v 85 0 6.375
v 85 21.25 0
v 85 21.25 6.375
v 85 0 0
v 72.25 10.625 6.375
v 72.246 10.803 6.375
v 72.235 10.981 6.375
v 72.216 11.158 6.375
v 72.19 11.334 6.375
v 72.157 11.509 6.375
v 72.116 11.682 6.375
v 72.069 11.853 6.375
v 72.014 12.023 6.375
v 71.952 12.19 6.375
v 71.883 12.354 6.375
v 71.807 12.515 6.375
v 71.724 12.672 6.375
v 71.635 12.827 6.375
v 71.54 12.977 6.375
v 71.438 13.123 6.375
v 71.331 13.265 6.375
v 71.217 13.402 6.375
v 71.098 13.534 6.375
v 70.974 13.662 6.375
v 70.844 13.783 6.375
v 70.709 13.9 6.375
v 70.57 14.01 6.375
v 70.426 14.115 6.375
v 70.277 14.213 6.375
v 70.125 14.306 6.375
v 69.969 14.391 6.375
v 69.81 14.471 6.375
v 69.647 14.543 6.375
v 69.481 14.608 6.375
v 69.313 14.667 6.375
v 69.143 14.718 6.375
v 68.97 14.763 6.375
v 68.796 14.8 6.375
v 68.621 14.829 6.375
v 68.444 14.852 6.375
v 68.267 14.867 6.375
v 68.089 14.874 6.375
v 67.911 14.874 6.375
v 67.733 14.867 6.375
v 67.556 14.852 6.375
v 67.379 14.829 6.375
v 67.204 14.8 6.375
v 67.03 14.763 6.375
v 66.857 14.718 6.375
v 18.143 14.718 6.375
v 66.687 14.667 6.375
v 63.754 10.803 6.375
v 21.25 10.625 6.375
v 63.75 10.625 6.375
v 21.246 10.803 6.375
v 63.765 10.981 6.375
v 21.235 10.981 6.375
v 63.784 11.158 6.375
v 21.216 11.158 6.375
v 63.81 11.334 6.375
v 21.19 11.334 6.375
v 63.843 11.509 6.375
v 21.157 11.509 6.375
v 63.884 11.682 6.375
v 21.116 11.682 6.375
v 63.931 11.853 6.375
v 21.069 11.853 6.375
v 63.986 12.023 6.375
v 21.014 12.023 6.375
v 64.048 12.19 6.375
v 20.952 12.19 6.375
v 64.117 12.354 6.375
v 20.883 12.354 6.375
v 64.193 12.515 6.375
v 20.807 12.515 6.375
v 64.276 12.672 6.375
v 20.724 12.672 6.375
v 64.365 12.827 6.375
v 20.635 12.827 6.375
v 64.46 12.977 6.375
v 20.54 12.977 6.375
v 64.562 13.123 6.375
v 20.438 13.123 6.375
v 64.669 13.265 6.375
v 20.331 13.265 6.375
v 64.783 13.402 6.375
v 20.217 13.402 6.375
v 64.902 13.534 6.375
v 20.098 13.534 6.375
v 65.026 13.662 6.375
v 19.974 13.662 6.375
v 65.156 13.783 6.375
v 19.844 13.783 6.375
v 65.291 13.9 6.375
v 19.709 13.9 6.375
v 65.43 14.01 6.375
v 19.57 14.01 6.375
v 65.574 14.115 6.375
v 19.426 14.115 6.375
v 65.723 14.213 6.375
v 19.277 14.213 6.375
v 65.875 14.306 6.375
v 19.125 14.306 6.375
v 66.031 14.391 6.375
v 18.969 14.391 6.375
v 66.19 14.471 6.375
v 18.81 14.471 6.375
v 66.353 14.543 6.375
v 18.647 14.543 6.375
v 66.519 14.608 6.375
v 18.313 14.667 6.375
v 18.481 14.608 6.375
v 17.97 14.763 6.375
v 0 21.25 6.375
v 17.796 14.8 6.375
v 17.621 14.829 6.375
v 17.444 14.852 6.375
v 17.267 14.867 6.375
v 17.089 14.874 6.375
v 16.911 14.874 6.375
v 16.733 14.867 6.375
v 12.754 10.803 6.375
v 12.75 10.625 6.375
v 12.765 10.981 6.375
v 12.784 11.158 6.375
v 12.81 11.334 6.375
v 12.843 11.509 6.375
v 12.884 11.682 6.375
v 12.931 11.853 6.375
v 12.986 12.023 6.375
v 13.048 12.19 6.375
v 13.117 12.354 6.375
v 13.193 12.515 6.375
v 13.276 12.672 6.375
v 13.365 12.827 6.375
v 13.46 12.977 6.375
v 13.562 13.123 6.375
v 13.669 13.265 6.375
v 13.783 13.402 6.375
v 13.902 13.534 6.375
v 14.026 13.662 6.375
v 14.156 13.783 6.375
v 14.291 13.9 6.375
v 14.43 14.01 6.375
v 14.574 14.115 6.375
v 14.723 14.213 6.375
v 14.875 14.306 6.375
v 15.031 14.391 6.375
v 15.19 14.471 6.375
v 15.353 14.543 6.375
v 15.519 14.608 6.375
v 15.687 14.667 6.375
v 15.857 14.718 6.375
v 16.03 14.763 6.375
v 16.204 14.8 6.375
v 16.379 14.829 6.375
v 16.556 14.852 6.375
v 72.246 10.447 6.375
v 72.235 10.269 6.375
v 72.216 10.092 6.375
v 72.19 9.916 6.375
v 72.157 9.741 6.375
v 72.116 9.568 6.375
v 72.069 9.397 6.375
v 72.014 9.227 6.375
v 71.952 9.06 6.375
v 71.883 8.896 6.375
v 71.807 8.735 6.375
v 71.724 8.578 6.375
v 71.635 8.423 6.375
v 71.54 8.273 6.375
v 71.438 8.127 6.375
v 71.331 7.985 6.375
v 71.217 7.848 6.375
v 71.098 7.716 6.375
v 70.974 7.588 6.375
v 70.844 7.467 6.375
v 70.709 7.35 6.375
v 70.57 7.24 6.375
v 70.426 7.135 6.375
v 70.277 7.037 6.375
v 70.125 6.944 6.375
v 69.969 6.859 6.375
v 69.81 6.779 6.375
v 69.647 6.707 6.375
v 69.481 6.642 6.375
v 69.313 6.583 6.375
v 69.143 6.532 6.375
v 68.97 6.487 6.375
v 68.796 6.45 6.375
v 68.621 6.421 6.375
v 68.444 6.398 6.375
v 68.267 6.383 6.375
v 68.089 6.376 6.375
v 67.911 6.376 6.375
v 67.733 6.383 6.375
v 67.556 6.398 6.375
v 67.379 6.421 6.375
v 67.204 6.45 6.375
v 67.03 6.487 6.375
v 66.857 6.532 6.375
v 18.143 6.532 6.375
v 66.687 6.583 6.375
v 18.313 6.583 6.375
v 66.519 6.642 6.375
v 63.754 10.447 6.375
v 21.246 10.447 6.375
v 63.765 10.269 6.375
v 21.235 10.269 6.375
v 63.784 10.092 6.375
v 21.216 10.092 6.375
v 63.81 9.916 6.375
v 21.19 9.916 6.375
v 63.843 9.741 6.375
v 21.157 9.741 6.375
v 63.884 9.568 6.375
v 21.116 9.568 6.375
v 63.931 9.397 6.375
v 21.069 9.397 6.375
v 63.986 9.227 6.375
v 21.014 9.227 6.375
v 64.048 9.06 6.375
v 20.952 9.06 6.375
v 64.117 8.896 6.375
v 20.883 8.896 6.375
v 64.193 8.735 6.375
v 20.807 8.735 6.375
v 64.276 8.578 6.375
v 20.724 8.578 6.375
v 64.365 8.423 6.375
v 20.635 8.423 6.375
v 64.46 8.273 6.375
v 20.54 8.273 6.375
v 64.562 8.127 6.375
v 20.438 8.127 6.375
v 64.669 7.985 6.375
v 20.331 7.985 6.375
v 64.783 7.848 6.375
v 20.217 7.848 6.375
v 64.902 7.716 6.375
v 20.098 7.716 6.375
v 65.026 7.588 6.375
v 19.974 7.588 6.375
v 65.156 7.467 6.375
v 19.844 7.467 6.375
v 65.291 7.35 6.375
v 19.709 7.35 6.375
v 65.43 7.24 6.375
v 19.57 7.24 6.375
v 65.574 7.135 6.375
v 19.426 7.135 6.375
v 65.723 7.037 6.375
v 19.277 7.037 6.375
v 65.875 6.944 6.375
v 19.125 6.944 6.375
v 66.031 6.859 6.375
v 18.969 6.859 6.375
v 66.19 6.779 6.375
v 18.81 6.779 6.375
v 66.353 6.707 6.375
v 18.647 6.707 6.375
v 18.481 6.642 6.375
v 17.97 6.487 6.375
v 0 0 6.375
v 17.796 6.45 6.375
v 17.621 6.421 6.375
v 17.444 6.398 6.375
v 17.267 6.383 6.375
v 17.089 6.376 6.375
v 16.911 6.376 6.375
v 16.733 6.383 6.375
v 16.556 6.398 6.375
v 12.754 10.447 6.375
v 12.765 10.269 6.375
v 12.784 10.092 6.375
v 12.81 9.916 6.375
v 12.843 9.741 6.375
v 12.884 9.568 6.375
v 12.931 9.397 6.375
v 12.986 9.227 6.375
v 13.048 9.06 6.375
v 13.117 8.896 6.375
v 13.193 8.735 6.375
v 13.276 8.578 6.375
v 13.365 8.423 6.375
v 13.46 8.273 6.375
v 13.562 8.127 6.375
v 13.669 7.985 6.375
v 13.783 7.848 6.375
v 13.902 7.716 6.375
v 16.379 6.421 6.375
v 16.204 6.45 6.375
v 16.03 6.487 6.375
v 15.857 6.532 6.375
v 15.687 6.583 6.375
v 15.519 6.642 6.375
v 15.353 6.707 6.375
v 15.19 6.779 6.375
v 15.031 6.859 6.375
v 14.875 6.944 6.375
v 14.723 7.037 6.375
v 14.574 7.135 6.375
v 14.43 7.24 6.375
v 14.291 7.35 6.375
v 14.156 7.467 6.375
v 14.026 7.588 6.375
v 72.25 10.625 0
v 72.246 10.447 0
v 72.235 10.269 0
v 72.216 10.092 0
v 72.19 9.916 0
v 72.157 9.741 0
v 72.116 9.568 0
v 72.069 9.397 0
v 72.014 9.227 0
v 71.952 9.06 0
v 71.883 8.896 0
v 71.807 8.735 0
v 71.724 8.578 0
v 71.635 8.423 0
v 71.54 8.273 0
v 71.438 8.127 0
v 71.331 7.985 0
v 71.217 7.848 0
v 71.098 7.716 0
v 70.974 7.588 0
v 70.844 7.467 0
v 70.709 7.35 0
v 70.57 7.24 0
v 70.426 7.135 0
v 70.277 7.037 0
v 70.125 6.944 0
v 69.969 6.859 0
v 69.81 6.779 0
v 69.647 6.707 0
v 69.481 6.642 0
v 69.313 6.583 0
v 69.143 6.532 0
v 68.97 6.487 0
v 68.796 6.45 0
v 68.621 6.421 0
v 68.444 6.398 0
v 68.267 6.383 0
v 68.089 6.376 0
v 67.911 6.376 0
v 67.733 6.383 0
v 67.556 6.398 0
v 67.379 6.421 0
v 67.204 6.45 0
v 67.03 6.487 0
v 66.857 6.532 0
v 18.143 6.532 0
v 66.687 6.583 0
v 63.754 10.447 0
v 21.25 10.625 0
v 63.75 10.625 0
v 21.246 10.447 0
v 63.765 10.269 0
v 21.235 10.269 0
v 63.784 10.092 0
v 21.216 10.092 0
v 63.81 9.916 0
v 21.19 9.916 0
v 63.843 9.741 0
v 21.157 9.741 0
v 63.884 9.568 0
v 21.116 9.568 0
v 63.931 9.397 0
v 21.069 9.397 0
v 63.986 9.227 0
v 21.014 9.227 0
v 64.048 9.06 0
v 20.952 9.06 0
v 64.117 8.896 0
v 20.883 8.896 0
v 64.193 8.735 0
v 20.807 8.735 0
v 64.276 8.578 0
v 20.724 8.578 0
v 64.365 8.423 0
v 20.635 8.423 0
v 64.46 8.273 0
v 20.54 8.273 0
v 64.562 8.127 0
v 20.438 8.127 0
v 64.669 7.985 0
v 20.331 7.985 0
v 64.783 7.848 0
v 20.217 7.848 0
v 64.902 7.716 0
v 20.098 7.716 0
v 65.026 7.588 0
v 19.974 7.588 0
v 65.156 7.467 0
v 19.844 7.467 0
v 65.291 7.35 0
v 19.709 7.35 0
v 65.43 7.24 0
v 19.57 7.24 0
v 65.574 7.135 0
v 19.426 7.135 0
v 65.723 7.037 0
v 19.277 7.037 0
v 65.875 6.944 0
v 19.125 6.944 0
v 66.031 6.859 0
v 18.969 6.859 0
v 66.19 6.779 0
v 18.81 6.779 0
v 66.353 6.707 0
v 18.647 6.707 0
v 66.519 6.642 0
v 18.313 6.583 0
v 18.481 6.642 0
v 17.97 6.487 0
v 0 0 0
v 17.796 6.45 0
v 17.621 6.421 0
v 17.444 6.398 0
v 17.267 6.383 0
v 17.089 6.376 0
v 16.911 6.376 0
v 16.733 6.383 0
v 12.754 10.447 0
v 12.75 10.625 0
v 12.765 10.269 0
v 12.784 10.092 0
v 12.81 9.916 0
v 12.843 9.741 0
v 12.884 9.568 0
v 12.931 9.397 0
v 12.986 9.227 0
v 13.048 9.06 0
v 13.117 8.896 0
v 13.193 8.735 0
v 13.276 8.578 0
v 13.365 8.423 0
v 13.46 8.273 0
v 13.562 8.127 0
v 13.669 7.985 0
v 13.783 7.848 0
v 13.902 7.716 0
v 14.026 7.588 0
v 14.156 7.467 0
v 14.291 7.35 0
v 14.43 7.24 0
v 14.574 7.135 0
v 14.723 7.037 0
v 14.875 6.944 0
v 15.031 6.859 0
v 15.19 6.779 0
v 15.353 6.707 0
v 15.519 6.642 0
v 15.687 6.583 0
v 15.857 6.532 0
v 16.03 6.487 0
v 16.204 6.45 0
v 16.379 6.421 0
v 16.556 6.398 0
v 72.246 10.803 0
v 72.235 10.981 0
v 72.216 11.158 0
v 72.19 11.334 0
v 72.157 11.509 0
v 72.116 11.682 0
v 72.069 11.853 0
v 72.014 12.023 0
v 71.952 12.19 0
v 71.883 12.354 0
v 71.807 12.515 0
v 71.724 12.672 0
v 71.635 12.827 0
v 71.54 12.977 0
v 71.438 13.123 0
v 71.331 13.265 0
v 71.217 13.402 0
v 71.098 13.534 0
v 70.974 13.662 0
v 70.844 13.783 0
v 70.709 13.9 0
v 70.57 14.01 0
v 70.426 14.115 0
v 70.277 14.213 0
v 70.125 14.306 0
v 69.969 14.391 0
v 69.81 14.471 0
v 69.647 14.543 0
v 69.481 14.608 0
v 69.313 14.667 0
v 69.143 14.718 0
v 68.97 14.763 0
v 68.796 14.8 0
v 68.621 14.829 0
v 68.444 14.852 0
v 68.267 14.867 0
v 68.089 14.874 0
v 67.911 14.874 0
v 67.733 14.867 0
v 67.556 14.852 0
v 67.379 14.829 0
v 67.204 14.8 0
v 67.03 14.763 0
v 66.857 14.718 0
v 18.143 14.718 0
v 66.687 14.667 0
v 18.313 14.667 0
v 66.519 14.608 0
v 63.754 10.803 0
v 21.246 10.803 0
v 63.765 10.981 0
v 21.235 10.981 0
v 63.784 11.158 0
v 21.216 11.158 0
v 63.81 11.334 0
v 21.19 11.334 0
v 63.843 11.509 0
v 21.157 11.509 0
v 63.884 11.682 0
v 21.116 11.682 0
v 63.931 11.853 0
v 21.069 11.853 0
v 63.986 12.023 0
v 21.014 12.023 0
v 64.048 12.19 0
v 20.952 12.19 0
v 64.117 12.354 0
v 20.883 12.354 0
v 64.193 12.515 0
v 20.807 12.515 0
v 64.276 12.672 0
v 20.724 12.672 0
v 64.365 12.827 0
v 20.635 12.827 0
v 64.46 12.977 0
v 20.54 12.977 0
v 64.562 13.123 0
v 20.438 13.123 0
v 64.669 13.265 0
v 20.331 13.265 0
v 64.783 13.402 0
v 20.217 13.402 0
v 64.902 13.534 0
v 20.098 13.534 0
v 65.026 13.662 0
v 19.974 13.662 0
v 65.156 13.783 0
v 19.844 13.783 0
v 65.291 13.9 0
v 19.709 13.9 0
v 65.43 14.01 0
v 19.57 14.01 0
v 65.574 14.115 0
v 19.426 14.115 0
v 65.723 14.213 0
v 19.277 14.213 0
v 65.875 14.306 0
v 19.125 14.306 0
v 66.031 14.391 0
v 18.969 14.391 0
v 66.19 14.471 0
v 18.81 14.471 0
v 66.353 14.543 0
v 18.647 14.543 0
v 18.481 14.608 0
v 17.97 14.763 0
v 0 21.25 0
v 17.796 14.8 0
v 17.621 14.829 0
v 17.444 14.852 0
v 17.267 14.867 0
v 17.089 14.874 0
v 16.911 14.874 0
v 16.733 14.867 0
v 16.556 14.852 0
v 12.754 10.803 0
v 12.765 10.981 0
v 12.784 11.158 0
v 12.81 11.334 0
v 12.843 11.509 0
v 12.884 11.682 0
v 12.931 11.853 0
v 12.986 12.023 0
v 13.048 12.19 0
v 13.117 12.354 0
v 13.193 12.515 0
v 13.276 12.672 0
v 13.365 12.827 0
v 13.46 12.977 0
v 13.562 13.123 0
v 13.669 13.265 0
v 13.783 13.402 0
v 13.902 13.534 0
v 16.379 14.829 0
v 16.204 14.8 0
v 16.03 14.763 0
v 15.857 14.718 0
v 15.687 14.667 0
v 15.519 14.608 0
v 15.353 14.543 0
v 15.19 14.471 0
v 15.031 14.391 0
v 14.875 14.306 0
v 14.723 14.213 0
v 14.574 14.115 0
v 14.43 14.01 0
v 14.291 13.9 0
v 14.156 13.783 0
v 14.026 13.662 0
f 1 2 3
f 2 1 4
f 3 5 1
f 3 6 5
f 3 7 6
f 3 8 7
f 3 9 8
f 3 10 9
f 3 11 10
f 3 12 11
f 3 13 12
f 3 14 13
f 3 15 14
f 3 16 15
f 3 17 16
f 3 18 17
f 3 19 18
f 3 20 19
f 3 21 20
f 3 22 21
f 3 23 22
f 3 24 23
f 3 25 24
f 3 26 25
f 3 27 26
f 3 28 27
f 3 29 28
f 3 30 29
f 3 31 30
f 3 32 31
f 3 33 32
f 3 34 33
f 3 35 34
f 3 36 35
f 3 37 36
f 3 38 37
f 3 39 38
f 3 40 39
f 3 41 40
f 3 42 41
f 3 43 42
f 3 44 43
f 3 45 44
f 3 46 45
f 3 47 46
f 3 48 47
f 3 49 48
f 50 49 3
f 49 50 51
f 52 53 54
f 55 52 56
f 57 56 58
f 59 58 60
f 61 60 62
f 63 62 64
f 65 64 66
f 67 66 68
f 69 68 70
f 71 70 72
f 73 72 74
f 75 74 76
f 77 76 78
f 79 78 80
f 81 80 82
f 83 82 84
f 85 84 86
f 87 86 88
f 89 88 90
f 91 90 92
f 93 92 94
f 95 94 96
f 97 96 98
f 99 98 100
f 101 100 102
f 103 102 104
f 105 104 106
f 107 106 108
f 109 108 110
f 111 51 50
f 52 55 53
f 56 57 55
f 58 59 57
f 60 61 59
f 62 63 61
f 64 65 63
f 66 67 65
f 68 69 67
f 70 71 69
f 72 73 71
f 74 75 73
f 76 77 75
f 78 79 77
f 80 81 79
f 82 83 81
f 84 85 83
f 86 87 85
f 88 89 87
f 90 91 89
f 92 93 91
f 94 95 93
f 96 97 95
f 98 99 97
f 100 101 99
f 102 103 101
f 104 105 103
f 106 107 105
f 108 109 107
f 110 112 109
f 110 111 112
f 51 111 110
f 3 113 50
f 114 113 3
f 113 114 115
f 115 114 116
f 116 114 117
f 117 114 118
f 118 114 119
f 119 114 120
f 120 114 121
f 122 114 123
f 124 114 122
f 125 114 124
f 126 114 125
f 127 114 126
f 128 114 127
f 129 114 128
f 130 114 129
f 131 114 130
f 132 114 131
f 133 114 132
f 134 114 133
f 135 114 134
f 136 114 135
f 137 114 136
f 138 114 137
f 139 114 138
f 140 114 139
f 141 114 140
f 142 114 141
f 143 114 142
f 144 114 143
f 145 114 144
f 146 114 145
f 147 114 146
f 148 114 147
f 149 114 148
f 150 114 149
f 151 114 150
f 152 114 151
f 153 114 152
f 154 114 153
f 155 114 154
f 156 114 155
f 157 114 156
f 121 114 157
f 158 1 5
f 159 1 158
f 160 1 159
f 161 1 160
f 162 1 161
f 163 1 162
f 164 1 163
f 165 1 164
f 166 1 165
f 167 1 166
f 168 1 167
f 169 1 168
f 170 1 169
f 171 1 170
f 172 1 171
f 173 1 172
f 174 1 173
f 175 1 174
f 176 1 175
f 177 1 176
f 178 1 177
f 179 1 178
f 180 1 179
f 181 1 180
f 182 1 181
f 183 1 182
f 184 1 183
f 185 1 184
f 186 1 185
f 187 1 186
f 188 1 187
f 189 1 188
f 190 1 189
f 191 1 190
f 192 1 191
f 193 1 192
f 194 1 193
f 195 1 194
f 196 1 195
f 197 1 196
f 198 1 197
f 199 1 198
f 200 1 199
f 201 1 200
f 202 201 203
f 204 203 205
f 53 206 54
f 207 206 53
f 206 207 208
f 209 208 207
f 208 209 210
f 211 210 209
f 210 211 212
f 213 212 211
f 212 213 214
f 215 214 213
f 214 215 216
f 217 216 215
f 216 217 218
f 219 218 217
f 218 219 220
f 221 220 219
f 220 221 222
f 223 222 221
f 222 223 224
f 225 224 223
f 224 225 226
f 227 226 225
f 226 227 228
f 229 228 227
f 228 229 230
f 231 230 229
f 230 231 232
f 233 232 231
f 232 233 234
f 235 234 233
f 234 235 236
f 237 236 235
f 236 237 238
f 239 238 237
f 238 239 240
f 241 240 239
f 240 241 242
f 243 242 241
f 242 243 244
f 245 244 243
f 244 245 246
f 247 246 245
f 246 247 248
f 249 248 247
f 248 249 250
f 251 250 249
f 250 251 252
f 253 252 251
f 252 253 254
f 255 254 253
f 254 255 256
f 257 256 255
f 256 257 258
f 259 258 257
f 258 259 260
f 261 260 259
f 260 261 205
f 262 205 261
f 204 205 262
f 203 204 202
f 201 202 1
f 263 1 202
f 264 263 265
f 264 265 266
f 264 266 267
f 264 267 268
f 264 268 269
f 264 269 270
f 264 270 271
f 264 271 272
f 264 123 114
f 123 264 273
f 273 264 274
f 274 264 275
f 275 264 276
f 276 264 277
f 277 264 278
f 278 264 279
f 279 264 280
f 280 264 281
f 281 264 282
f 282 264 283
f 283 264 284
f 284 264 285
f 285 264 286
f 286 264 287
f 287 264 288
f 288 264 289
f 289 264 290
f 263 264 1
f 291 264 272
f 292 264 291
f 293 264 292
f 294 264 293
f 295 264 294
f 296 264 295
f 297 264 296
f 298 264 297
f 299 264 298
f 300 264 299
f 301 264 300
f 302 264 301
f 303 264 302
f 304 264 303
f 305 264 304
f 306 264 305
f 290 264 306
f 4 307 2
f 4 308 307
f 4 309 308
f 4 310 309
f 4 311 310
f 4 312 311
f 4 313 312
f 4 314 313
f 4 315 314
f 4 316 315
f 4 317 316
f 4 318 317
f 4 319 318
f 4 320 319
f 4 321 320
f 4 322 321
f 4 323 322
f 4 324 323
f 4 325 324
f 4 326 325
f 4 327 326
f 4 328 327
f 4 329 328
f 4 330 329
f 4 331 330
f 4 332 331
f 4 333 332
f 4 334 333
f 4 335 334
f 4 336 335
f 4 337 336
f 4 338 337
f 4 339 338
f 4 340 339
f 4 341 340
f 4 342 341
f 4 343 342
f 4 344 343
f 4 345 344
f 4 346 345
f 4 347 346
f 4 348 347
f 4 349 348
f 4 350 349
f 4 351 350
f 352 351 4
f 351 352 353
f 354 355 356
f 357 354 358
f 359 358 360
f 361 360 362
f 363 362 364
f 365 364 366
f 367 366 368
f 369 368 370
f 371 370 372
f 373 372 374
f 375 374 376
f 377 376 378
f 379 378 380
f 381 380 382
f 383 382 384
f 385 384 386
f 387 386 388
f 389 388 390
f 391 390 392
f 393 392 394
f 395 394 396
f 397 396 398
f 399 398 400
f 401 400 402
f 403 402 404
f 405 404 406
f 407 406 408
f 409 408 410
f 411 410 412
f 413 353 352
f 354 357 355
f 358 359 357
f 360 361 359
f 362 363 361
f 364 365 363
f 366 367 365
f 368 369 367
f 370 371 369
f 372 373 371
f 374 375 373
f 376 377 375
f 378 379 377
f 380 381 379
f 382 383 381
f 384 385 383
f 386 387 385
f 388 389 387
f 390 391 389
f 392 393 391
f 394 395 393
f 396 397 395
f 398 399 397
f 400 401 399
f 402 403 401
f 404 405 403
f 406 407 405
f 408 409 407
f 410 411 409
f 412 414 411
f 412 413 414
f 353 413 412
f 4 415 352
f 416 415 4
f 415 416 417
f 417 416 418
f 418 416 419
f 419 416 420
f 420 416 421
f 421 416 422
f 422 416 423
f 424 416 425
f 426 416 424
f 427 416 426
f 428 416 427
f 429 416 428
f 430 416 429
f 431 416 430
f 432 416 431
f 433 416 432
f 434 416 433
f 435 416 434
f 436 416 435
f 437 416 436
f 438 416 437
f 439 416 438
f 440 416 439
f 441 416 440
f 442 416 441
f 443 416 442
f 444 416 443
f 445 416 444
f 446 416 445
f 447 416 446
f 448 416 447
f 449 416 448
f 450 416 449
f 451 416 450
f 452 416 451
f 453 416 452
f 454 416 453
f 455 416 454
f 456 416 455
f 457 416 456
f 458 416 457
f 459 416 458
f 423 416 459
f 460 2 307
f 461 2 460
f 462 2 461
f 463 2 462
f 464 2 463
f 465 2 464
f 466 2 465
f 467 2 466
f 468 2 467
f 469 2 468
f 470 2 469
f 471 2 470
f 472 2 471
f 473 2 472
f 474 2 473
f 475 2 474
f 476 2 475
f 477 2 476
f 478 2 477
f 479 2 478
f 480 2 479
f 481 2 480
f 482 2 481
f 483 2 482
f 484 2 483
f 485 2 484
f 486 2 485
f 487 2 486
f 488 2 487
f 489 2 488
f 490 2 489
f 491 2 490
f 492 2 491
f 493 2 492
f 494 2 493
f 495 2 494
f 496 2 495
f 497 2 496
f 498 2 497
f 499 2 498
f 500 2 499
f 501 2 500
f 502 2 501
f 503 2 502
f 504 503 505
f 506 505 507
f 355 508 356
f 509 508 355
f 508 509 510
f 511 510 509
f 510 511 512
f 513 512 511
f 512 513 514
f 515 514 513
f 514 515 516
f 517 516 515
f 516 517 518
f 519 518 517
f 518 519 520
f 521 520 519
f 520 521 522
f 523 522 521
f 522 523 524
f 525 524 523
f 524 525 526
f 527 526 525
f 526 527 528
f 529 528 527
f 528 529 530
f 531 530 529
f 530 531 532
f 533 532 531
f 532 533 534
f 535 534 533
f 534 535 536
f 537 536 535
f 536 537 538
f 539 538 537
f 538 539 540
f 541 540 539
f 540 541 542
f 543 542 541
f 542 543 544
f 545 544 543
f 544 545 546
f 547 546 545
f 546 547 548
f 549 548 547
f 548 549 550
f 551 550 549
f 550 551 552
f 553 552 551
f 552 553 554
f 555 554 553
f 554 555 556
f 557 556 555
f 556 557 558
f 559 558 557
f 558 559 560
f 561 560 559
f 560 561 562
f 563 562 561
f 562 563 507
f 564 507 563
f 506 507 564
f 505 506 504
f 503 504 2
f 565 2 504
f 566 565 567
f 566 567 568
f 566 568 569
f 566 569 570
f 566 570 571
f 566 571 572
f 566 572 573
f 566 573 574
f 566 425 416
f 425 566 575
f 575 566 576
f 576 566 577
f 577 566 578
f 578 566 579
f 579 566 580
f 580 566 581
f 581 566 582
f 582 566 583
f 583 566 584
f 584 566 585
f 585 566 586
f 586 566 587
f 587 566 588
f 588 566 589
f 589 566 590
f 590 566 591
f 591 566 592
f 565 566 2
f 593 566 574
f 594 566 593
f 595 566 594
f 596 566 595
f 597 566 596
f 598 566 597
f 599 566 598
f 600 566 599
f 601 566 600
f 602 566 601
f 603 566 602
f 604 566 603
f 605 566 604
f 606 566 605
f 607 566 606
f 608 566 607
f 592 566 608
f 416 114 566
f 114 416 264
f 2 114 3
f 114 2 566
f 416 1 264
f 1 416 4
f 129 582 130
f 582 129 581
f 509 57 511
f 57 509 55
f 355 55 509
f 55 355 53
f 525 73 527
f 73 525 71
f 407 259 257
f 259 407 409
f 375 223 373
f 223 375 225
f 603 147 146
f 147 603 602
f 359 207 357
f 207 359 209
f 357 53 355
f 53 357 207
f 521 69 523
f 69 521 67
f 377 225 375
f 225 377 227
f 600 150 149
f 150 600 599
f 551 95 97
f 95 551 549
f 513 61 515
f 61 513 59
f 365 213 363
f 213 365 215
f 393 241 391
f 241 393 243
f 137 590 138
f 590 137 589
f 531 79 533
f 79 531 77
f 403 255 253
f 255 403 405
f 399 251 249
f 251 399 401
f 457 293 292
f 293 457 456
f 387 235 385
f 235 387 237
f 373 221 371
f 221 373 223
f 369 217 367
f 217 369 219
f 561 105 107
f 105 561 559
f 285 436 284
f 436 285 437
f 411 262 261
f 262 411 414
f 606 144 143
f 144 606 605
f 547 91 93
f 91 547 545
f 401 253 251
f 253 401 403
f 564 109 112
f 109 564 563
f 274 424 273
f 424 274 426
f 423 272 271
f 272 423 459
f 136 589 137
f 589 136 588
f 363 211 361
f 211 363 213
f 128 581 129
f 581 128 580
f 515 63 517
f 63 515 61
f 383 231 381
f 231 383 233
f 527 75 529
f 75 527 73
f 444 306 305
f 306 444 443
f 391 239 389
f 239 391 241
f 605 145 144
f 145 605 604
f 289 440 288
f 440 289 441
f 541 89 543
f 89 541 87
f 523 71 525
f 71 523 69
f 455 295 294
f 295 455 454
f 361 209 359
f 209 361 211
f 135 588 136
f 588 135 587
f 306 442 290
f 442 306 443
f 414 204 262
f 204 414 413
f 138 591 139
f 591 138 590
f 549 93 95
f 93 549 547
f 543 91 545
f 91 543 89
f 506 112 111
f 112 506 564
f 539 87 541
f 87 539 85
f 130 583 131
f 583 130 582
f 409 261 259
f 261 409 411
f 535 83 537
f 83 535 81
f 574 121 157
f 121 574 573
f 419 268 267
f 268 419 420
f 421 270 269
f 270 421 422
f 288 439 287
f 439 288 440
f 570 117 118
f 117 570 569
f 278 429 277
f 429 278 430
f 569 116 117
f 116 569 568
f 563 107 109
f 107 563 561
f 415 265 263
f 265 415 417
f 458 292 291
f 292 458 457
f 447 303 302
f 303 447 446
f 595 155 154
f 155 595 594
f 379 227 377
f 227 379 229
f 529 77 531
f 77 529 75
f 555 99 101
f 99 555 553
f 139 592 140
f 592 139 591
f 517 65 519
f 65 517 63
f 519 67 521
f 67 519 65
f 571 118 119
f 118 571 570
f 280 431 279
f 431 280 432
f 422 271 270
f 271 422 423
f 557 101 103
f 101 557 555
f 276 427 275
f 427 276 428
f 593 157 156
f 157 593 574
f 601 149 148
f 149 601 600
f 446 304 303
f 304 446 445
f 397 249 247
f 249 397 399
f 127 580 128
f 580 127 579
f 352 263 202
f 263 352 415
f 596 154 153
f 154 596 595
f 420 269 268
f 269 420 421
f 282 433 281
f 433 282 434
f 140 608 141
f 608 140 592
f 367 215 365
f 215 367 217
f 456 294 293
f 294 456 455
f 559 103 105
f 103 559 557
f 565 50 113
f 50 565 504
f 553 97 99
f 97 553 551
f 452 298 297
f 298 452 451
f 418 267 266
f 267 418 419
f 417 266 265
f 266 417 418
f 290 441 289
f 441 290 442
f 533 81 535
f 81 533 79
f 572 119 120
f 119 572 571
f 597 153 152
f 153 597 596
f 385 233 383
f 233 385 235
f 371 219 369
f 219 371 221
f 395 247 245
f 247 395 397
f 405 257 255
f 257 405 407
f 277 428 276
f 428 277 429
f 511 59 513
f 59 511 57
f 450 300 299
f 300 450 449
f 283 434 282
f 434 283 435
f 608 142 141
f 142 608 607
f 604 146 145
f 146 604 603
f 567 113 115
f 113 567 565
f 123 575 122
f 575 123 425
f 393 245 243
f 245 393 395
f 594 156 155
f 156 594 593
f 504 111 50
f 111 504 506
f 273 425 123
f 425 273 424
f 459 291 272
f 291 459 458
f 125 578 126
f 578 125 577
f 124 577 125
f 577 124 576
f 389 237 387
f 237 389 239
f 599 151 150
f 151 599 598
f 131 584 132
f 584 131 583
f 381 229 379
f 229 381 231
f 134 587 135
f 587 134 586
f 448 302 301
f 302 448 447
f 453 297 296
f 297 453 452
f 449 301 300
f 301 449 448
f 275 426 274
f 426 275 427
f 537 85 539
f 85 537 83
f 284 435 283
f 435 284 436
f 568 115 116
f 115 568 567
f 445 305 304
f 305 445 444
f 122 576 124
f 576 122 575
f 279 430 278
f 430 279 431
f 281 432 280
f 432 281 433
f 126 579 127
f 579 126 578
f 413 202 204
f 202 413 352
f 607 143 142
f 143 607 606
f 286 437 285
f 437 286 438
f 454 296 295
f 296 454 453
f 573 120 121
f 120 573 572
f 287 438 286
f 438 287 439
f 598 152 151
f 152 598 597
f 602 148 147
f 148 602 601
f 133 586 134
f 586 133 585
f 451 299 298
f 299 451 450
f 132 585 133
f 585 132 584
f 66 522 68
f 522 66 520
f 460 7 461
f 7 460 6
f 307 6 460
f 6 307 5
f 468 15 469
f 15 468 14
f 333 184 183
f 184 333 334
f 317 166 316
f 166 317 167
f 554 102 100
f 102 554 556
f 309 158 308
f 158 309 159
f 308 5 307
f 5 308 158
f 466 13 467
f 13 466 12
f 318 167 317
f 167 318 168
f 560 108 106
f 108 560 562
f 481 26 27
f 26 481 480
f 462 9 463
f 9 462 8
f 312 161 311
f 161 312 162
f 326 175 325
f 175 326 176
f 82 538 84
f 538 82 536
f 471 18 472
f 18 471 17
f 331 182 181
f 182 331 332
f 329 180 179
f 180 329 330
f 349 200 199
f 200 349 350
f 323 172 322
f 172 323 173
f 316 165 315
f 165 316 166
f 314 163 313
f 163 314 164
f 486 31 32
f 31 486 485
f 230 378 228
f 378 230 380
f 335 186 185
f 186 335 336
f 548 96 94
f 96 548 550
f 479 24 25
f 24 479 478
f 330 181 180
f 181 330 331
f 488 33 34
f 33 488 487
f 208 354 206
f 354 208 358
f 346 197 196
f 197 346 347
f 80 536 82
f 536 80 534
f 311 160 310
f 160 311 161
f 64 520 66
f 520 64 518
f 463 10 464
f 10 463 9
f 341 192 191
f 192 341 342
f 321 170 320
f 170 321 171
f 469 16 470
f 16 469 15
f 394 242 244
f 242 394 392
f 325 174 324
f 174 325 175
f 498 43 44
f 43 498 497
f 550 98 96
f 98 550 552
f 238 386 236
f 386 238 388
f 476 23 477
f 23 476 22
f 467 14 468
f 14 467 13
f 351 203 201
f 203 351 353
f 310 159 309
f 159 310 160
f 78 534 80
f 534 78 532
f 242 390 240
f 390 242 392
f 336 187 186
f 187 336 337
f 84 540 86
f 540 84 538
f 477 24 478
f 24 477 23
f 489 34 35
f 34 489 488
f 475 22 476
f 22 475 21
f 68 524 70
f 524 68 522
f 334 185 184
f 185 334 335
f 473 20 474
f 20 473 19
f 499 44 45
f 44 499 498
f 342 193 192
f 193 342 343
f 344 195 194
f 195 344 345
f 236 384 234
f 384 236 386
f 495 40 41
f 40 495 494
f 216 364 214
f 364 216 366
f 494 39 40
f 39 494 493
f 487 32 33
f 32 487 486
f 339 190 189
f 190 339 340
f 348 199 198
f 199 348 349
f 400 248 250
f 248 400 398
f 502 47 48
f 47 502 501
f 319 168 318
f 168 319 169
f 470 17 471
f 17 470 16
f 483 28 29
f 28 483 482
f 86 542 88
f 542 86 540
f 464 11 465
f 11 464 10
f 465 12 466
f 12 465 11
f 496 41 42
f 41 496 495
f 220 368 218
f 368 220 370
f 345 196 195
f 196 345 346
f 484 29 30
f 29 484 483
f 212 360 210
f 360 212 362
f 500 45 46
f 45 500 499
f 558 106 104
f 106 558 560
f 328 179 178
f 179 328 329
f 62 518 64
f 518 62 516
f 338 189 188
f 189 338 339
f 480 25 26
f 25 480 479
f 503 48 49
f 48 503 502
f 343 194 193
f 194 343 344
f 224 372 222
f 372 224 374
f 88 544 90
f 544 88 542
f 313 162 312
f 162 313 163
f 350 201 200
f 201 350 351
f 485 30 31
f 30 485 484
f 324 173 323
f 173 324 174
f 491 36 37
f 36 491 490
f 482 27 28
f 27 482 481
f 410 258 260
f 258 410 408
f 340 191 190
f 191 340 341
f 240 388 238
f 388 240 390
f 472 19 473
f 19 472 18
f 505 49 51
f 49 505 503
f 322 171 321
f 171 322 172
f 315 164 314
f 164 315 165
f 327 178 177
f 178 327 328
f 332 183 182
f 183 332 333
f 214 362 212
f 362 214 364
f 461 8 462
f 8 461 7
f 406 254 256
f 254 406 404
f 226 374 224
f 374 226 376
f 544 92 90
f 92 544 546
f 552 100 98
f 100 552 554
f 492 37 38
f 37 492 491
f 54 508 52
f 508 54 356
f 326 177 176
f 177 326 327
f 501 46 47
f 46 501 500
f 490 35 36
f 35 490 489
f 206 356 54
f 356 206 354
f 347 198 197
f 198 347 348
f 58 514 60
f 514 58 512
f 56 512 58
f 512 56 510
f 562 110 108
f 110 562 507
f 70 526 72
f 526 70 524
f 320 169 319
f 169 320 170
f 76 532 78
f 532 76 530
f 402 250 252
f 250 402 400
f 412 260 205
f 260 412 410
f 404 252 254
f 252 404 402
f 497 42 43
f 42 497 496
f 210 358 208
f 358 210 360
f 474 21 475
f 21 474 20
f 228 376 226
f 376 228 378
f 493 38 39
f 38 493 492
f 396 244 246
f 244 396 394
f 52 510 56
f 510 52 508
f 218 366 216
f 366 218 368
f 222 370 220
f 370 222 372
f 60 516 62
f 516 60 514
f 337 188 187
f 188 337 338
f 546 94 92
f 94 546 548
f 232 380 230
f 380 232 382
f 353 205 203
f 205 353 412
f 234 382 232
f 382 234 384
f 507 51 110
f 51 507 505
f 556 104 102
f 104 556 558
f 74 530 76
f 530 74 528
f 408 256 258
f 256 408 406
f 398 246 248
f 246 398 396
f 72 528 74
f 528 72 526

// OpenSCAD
$fn = 150;

difference() {
	cube(size = [85.0, 21.25, 6.375]);
	translate(v = [17.0, 10.625, -1]) {
		cylinder(d = 8.5, h = 8.375);
	}
	translate(v = [68.0, 10.625, -1]) {
		cylinder(d = 8.5, h = 8.375);
	}
}
